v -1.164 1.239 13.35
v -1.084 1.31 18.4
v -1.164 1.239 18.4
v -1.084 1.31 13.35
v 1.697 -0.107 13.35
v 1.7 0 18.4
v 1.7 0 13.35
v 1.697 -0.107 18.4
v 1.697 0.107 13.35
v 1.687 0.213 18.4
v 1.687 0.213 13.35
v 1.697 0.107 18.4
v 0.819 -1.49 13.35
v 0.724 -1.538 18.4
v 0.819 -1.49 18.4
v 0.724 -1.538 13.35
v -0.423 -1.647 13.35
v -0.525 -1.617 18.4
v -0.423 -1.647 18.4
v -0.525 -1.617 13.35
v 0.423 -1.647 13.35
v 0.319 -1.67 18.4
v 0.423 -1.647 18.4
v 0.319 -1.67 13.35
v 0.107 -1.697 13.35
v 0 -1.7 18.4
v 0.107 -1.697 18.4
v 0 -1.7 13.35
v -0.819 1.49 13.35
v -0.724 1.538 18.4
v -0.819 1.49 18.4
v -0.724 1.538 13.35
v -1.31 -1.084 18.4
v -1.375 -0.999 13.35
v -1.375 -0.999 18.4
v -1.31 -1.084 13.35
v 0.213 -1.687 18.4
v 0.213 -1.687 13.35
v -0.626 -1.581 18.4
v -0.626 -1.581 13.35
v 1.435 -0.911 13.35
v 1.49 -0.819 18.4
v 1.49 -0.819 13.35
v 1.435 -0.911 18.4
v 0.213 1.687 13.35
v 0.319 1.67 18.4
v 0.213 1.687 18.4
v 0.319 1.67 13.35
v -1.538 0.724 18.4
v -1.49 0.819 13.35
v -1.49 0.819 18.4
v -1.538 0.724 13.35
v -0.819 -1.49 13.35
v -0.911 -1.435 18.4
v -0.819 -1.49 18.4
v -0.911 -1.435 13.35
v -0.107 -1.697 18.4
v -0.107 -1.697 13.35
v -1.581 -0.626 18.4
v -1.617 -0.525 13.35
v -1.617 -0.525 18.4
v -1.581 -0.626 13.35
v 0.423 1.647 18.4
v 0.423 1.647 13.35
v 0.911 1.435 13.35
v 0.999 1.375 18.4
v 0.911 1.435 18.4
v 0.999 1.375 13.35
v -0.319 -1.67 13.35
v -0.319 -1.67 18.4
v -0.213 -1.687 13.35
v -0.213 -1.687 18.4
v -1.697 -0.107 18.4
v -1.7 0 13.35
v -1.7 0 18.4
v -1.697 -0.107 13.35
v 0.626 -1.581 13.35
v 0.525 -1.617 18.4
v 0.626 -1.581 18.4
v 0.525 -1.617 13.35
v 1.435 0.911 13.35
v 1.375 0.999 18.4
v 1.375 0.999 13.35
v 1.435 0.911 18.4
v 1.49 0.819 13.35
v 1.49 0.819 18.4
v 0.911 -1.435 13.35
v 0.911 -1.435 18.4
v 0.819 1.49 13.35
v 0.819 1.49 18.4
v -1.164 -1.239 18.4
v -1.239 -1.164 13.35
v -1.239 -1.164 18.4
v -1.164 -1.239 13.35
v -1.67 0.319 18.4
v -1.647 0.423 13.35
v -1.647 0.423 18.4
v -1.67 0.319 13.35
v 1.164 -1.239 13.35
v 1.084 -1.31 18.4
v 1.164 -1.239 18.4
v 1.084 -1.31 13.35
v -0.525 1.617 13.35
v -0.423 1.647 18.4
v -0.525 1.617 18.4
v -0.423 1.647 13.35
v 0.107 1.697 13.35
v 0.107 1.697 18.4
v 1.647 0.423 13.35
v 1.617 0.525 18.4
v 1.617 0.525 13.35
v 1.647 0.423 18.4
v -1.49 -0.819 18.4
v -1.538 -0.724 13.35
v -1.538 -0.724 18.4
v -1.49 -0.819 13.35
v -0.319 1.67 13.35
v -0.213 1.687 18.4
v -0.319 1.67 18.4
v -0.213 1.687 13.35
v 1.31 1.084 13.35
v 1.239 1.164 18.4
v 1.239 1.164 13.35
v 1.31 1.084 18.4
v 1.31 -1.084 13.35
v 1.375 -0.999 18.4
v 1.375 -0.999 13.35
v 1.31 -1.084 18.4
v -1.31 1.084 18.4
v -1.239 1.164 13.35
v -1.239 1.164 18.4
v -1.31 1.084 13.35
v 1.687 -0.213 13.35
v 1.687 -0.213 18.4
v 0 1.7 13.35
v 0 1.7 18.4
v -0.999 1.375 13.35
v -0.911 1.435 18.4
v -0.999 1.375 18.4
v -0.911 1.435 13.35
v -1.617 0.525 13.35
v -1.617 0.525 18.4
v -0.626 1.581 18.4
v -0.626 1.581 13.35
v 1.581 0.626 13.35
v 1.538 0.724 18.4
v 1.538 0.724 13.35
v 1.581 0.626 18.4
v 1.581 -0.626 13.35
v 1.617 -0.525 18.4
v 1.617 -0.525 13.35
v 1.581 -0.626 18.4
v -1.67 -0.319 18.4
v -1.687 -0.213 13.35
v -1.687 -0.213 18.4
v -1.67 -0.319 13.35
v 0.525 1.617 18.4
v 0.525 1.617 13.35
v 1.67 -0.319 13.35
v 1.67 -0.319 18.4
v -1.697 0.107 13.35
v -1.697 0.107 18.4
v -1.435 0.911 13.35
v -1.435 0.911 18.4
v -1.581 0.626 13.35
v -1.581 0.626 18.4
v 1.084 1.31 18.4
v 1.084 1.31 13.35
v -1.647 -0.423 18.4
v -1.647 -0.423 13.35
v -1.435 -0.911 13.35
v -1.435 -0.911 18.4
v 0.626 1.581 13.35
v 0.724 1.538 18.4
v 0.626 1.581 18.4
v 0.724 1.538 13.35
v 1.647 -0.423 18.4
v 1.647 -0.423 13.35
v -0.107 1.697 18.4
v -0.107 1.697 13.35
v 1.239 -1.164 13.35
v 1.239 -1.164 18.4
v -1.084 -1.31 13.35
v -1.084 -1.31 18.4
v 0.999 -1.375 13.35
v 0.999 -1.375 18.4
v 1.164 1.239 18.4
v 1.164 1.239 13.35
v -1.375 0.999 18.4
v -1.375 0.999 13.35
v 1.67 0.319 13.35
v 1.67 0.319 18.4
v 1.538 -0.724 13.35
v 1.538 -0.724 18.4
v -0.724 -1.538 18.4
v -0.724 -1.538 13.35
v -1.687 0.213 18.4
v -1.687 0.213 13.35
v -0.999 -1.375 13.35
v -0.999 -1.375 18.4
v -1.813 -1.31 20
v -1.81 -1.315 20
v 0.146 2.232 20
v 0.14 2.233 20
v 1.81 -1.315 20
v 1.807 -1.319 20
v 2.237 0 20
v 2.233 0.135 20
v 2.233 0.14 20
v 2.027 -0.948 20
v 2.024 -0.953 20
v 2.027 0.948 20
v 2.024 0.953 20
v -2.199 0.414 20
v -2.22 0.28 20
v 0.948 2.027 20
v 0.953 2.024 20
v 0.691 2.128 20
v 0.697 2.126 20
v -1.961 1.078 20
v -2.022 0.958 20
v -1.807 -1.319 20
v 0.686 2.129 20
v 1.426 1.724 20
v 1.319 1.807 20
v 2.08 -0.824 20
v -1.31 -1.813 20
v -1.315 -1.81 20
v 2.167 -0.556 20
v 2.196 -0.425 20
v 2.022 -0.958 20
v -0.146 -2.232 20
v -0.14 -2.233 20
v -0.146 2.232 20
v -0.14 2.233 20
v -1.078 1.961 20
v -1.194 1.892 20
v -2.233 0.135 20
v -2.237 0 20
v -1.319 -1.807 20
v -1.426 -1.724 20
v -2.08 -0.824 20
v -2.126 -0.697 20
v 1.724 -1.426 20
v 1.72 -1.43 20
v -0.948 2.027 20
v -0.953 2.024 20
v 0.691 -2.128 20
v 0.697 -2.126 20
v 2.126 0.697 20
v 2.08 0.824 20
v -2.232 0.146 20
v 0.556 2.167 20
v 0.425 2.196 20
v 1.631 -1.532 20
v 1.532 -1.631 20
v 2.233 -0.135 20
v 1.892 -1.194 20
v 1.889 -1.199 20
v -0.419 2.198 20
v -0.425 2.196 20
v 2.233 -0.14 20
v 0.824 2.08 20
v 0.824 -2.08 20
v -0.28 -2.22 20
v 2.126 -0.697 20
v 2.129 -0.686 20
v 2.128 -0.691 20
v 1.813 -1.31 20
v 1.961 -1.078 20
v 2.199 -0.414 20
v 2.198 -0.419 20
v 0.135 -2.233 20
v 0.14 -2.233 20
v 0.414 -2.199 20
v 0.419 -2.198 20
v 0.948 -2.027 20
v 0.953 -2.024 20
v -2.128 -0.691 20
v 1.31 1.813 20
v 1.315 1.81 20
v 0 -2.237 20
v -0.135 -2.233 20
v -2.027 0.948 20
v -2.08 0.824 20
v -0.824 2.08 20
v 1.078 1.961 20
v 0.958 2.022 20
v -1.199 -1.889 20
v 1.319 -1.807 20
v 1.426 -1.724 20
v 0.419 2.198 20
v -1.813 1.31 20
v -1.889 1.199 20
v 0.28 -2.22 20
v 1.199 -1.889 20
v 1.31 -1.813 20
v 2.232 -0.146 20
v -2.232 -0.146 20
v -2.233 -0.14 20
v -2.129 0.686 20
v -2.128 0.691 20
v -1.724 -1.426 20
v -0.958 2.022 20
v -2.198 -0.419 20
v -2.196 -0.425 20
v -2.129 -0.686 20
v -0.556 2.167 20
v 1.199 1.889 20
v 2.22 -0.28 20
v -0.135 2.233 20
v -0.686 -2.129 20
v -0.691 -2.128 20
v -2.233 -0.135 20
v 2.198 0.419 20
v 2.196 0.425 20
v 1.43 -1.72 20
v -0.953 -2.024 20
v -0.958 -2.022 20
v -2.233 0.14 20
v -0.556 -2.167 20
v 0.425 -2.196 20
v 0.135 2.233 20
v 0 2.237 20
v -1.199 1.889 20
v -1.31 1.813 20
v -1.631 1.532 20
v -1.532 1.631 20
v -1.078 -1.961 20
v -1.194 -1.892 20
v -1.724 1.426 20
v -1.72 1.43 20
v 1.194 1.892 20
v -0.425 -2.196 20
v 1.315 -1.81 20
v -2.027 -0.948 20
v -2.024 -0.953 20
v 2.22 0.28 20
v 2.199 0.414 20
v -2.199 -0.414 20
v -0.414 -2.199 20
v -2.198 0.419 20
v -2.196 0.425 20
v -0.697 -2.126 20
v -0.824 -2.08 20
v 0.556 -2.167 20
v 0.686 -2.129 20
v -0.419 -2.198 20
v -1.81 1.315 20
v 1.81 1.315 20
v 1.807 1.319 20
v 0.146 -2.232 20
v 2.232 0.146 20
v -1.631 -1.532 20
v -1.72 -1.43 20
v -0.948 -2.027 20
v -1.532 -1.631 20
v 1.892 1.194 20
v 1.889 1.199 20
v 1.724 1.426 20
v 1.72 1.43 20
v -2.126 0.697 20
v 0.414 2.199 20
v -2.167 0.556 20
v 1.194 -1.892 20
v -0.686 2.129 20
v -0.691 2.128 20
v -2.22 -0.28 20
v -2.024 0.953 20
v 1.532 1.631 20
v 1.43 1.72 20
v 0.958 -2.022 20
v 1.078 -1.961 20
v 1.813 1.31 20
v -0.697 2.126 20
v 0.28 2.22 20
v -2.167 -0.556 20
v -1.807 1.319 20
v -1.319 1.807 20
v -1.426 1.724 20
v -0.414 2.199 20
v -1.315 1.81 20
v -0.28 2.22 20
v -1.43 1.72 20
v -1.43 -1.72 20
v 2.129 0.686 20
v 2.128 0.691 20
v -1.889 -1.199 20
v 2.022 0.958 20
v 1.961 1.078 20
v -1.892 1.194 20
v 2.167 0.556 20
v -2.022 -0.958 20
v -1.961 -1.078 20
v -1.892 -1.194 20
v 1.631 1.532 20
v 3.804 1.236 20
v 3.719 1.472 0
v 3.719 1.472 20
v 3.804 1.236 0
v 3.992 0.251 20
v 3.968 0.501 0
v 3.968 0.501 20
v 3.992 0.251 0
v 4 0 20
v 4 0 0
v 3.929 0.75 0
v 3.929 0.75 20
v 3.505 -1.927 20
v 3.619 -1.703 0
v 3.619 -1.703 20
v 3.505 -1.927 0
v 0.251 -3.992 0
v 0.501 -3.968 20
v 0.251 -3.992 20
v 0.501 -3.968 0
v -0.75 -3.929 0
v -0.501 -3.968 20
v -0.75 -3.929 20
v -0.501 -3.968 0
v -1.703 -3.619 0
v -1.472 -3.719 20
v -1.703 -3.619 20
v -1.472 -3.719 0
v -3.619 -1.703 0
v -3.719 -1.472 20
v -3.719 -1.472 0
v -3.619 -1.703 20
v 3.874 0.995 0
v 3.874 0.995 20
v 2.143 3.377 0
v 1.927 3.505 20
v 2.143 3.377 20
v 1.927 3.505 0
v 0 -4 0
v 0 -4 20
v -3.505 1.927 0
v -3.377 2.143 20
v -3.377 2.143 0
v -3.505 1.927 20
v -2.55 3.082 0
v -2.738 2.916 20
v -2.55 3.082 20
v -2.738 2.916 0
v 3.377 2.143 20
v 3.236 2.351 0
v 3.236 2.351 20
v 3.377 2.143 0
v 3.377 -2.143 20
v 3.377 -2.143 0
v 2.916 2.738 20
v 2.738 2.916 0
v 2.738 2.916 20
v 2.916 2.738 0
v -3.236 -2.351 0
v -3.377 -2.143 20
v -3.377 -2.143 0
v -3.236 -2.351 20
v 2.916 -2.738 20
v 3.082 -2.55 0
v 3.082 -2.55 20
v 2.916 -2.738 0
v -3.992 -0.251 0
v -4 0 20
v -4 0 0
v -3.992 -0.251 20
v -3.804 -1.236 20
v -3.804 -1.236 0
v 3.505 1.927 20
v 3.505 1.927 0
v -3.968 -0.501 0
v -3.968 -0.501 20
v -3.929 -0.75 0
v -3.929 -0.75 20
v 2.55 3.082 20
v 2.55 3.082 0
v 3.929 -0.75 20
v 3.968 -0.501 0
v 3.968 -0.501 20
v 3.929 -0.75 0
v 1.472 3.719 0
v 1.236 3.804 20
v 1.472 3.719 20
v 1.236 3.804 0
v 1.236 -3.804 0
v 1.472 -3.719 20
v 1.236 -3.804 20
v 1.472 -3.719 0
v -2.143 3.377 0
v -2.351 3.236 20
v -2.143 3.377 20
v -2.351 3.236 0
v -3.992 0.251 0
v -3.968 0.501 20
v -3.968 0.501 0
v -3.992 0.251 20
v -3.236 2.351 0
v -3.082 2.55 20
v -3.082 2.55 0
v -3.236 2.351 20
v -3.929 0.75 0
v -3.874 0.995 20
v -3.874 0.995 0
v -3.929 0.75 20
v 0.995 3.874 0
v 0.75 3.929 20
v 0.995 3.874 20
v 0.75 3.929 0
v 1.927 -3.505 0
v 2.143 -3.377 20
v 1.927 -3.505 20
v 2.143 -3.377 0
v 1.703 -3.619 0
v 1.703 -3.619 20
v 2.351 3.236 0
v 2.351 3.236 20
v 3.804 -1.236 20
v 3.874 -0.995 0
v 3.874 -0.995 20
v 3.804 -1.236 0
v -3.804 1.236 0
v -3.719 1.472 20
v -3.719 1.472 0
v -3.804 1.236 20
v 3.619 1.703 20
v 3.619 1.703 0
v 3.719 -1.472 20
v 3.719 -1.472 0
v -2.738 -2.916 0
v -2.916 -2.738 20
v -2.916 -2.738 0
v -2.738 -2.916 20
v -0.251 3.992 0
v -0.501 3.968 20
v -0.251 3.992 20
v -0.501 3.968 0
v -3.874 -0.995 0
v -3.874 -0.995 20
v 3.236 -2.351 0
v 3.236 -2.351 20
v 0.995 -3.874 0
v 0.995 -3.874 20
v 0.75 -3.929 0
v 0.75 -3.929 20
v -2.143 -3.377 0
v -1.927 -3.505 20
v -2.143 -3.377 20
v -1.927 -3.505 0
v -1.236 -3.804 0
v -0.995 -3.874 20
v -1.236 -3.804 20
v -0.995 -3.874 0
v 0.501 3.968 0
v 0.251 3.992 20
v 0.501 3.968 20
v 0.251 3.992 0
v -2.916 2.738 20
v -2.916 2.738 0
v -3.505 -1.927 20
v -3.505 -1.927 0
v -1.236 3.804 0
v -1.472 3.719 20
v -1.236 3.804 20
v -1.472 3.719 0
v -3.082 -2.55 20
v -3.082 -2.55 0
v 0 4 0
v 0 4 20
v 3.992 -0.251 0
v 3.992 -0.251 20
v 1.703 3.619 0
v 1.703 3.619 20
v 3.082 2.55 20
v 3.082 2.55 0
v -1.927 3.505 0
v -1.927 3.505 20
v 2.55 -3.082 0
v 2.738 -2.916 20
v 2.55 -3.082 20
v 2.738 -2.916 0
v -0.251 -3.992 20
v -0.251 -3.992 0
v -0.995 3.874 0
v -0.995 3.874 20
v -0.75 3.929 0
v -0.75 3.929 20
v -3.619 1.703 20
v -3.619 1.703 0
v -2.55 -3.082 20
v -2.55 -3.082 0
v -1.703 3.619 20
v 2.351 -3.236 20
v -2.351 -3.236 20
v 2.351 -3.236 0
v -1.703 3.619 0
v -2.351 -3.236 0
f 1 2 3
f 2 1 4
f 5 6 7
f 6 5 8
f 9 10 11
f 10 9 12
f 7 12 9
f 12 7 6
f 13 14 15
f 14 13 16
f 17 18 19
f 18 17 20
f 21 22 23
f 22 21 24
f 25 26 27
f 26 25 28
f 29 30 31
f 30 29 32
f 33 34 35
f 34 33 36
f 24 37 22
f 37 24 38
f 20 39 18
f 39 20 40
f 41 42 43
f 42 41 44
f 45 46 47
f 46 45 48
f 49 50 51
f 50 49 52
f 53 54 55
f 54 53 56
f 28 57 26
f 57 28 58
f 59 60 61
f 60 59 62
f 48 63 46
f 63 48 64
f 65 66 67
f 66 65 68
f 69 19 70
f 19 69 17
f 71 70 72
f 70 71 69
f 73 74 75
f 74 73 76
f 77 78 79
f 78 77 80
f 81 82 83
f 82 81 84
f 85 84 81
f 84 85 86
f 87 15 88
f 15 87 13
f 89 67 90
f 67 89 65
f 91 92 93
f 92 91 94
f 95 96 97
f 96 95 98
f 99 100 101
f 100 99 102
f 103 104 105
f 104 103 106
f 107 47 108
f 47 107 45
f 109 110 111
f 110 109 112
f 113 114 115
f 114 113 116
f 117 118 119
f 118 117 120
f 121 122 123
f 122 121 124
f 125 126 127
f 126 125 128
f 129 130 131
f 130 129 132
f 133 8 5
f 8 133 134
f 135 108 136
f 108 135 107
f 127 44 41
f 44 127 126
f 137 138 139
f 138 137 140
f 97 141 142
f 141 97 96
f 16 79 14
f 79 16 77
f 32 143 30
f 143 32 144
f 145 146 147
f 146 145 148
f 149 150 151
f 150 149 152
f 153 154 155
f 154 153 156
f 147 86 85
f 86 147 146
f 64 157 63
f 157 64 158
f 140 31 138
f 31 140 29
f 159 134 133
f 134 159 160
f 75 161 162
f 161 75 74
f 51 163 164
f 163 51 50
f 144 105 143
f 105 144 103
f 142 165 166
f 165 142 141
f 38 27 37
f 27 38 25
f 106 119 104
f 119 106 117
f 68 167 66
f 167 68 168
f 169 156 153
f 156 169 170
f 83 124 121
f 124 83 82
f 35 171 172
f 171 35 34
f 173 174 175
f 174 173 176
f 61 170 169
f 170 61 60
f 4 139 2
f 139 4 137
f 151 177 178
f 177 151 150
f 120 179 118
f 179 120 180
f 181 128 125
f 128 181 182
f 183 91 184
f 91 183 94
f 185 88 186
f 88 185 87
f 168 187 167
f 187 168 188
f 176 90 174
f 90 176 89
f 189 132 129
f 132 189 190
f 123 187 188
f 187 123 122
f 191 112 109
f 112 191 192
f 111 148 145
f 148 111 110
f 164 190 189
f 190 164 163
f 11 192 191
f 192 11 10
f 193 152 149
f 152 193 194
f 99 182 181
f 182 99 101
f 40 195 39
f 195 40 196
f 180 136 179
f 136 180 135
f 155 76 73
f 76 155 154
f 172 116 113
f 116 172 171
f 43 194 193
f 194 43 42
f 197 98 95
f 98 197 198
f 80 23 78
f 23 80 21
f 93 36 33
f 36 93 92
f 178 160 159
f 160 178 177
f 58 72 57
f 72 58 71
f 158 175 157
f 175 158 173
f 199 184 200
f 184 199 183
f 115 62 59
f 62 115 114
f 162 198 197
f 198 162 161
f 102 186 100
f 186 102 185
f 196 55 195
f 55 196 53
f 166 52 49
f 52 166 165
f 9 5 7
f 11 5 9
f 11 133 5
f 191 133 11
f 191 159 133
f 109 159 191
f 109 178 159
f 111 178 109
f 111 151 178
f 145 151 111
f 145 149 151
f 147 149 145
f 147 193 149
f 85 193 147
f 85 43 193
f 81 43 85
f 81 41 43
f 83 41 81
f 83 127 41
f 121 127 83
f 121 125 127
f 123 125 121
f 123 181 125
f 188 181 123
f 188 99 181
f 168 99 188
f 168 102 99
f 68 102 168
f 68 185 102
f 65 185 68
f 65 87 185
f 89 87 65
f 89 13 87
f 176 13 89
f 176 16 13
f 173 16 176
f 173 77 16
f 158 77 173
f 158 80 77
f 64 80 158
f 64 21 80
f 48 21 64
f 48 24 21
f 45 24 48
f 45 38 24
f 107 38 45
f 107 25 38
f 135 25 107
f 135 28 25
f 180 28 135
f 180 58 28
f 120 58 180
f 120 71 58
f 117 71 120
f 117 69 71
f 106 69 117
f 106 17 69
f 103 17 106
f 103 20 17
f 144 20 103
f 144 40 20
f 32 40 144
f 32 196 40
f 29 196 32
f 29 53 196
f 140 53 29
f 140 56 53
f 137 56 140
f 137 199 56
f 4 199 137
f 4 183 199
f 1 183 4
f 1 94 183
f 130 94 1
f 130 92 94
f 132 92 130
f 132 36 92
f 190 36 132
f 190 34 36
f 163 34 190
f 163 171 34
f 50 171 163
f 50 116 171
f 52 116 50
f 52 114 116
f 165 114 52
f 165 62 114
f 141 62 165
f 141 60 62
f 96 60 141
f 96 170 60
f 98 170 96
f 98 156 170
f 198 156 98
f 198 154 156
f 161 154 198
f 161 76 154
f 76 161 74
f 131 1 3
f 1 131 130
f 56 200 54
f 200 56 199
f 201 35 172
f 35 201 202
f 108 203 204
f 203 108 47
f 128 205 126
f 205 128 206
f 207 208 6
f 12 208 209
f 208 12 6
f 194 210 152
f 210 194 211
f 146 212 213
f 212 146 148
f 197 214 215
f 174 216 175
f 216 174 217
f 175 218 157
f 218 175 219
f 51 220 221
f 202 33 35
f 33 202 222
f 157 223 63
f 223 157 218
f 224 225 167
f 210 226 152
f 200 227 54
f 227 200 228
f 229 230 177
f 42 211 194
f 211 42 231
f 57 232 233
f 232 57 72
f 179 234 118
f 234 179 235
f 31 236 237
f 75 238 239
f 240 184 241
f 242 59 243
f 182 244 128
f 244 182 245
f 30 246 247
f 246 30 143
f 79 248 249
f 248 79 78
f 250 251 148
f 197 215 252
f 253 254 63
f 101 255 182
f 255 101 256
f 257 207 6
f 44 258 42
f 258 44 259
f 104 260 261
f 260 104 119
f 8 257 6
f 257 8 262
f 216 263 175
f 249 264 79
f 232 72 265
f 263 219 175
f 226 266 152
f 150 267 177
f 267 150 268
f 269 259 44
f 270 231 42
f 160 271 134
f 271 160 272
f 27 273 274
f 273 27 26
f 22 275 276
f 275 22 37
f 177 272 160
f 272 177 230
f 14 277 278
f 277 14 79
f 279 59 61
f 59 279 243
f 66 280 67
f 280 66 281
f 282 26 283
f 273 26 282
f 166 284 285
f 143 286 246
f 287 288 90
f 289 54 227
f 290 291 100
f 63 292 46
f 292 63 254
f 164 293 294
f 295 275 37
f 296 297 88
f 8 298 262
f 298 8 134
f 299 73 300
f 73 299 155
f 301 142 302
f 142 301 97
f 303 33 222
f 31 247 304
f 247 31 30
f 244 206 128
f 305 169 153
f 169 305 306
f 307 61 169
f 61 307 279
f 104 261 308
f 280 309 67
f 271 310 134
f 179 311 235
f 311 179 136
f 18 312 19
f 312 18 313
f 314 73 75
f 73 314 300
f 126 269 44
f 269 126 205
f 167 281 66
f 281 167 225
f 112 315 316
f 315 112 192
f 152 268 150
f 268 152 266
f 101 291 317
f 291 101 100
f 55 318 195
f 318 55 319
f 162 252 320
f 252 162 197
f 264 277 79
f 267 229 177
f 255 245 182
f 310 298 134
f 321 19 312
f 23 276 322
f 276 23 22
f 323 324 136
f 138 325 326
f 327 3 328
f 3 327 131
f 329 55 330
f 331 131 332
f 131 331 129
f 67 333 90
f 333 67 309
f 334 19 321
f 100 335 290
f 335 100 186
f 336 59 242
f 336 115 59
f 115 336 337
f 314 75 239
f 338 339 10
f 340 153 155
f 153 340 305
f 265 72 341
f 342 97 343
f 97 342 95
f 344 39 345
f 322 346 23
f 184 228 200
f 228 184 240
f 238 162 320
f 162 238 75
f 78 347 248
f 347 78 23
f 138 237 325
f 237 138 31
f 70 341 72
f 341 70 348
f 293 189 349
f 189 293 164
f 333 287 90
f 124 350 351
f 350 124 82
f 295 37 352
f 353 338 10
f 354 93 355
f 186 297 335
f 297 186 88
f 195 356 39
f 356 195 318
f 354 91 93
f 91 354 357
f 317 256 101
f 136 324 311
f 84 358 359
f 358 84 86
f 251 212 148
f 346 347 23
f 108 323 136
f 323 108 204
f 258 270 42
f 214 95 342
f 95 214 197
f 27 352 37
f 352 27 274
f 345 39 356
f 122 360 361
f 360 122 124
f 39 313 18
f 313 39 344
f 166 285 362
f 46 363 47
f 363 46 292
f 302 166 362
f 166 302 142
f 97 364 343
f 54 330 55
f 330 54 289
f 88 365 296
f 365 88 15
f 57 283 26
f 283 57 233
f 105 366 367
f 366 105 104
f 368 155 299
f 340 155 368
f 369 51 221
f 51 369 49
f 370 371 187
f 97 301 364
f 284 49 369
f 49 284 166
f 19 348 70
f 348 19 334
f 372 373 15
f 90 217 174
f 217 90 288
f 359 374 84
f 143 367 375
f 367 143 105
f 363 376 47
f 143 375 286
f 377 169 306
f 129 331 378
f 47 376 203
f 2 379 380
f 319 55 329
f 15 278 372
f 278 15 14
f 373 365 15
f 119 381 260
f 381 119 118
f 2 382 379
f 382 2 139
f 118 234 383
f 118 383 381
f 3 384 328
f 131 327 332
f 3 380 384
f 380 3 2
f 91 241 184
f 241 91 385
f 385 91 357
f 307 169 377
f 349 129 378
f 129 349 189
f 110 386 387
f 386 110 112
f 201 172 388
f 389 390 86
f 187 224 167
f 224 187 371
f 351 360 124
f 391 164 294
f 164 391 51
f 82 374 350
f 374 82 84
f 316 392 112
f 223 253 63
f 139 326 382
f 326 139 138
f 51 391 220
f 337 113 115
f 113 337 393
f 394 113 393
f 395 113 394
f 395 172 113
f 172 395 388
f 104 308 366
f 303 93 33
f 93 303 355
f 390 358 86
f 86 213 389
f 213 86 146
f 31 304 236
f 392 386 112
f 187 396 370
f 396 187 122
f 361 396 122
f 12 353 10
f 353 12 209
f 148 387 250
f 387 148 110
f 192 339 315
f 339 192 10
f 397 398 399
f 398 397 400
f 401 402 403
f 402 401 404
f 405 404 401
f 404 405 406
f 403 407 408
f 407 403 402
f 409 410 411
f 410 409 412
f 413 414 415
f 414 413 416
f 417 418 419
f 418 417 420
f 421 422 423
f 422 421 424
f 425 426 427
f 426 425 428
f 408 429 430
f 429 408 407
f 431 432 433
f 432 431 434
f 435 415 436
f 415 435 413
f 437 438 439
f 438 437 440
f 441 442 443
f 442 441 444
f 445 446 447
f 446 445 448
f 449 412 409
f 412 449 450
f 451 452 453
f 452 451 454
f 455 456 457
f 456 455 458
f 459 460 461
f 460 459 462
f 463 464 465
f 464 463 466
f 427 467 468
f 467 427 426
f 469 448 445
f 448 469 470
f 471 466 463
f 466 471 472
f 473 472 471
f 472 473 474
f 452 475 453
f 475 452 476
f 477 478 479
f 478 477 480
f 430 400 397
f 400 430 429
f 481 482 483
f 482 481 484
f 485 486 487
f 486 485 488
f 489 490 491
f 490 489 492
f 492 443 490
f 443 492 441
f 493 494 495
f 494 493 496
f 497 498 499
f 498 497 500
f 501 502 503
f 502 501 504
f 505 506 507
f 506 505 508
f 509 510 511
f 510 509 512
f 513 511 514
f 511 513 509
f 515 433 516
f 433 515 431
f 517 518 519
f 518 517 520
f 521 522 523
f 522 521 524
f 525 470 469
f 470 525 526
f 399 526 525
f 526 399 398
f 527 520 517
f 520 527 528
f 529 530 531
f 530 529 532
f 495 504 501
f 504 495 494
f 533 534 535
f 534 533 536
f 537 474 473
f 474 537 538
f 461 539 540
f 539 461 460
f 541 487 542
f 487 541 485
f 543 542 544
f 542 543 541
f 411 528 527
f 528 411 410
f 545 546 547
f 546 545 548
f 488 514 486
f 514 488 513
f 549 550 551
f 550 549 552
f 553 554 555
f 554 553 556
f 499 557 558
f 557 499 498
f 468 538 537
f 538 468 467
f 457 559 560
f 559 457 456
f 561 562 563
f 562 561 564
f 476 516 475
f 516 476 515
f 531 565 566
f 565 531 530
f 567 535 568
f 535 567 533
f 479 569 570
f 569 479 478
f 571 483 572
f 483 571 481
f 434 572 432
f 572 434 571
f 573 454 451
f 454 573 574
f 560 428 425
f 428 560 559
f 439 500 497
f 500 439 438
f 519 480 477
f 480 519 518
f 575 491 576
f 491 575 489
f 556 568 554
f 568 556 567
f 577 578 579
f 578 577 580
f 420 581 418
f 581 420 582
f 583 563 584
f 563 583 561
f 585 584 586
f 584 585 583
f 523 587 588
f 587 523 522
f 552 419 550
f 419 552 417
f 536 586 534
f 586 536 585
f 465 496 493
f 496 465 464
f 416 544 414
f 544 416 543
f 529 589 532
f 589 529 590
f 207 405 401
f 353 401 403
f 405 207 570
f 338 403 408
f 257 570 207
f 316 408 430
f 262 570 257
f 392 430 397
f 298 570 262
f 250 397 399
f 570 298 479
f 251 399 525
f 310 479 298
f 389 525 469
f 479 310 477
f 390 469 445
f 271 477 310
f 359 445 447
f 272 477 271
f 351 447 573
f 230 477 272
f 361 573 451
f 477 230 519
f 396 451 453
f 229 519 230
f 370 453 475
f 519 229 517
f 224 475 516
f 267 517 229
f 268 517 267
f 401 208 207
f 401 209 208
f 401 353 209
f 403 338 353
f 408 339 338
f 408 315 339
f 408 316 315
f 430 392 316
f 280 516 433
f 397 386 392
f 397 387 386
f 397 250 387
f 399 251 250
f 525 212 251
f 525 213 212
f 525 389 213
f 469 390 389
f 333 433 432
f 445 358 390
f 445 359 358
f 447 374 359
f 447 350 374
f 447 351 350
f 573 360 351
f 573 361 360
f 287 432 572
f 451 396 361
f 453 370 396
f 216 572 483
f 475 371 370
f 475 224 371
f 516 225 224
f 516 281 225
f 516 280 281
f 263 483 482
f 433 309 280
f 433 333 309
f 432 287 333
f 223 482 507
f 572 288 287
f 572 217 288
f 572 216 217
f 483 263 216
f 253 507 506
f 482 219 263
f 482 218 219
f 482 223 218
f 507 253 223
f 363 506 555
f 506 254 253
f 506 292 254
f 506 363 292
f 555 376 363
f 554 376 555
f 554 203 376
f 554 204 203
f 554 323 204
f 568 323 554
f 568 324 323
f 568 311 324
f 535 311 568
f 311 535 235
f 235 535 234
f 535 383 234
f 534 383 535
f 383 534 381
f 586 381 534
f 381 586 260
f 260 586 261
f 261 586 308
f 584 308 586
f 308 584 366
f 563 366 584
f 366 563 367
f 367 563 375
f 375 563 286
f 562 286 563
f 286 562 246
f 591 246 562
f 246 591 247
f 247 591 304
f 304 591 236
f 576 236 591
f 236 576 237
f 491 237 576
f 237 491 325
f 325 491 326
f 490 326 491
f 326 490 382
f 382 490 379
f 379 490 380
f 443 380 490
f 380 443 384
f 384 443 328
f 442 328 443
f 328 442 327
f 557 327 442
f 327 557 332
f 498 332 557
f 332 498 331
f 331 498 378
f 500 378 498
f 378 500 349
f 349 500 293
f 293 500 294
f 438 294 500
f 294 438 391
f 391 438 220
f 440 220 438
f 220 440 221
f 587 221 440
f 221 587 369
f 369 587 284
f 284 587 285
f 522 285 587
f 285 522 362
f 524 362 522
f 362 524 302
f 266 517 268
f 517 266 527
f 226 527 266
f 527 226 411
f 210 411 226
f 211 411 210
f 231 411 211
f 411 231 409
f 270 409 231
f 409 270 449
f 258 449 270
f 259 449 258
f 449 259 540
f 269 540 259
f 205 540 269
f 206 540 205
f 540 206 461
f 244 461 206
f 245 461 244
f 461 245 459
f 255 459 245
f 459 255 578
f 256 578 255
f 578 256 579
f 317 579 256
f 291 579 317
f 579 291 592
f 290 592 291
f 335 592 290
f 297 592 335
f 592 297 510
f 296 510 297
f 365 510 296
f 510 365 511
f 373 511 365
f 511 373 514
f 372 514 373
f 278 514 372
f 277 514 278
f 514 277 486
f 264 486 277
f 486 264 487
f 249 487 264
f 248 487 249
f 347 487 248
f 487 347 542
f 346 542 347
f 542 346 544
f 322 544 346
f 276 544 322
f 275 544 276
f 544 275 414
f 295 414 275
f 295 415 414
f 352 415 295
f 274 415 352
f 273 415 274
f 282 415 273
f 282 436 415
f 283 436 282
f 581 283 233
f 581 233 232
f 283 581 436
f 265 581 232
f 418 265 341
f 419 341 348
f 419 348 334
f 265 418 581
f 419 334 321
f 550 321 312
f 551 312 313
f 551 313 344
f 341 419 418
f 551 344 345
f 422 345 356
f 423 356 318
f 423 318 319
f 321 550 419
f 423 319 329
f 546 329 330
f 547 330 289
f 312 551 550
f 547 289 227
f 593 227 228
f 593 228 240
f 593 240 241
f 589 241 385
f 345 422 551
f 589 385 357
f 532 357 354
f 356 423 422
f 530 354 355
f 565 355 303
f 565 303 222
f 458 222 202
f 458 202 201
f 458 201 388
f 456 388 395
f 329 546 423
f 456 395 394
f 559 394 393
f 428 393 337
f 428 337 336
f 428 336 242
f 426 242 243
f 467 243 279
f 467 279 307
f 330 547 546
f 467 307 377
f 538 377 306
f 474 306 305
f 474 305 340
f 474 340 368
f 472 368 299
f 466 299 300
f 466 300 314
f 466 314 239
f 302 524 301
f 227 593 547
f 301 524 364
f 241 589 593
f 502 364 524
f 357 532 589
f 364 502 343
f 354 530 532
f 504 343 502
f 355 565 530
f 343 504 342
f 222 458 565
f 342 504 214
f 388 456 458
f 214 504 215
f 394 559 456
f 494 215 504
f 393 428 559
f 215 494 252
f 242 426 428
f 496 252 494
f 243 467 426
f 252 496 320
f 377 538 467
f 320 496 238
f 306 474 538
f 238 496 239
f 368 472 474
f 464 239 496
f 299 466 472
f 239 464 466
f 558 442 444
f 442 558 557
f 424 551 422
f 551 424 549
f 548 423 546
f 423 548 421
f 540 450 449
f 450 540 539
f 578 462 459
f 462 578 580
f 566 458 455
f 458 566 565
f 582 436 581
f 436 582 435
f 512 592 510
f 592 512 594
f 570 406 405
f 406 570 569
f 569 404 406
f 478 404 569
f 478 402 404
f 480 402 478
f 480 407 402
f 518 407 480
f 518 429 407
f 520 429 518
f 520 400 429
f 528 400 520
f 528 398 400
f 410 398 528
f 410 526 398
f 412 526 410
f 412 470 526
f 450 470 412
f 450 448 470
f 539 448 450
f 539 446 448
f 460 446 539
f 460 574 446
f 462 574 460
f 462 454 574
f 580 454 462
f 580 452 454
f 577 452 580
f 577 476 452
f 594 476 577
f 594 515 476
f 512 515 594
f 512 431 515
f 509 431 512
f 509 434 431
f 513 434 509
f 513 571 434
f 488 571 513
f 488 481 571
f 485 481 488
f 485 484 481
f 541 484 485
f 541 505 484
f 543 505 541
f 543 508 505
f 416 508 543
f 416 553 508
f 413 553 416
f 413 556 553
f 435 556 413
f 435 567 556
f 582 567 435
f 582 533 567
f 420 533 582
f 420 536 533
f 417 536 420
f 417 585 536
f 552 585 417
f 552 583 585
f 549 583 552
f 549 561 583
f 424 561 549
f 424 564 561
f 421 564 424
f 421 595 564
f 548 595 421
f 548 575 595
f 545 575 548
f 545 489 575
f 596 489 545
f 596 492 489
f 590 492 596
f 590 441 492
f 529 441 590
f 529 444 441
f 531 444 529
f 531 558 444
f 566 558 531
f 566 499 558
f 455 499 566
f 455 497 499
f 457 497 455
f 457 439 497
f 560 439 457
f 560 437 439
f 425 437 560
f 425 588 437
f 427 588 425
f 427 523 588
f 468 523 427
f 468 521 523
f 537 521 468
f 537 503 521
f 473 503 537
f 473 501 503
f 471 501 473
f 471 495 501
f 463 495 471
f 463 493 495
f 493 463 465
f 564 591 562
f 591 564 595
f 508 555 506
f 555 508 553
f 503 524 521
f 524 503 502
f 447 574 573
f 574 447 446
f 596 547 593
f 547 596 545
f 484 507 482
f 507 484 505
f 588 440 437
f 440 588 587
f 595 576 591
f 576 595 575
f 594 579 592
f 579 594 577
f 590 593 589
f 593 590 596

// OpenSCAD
$fn=100;

function MagnetDiam(3dPrinterTolerance=.4) = 3+3dPrinterTolerance;
function MagnetLength(3dPrinterTolerance=.4) = 6.35+3dPrinterTolerance;

module EncoderMagnet(Cylinder=true,3dPrinterTolerance=.4){

	if(Cylinder==true){
		cylinder(MagnetLength(3dPrinterTolerance),MagnetDiam(3dPrinterTolerance)/2,MagnetDiam(3dPrinterTolerance)/2);
	}else{
	translate([-(MagnetDiam(3dPrinterTolerance))/2,-(MagnetDiam(3dPrinterTolerance))/2,0]){
		cube([MagnetDiam(3dPrinterTolerance),MagnetDiam(3dPrinterTolerance),MagnetLength(3dPrinterTolerance)]);
		}
	}
}

//module to create a draft for the magnet.
module MagnetDraft(3dPrinterTolerance=.4){
	union(){
		EncoderMagnet(true,.4);
		translate([0,0,MagnetLength(3dPrinterTolerance)-1.7])
			cylinder(MagnetLength(3dPrinterTolerance)/4,MagnetDiam(3dPrinterTolerance)/2,MagnetDiam(3dPrinterTolerance)/2+MagnetDiam(3dPrinterTolerance)/6);
	}
}
	
//MagnetDraft(.4);

//module creates a shaft to fit inside things.

module magshaft(radius,height){
	difference(){
		cylinder(h=height,r=radius);
		translate([0,0,height-MagnetLength(.4)+.1]){
			MagnetDraft(.4);
		}
	}
}

magshaft(4,20);
